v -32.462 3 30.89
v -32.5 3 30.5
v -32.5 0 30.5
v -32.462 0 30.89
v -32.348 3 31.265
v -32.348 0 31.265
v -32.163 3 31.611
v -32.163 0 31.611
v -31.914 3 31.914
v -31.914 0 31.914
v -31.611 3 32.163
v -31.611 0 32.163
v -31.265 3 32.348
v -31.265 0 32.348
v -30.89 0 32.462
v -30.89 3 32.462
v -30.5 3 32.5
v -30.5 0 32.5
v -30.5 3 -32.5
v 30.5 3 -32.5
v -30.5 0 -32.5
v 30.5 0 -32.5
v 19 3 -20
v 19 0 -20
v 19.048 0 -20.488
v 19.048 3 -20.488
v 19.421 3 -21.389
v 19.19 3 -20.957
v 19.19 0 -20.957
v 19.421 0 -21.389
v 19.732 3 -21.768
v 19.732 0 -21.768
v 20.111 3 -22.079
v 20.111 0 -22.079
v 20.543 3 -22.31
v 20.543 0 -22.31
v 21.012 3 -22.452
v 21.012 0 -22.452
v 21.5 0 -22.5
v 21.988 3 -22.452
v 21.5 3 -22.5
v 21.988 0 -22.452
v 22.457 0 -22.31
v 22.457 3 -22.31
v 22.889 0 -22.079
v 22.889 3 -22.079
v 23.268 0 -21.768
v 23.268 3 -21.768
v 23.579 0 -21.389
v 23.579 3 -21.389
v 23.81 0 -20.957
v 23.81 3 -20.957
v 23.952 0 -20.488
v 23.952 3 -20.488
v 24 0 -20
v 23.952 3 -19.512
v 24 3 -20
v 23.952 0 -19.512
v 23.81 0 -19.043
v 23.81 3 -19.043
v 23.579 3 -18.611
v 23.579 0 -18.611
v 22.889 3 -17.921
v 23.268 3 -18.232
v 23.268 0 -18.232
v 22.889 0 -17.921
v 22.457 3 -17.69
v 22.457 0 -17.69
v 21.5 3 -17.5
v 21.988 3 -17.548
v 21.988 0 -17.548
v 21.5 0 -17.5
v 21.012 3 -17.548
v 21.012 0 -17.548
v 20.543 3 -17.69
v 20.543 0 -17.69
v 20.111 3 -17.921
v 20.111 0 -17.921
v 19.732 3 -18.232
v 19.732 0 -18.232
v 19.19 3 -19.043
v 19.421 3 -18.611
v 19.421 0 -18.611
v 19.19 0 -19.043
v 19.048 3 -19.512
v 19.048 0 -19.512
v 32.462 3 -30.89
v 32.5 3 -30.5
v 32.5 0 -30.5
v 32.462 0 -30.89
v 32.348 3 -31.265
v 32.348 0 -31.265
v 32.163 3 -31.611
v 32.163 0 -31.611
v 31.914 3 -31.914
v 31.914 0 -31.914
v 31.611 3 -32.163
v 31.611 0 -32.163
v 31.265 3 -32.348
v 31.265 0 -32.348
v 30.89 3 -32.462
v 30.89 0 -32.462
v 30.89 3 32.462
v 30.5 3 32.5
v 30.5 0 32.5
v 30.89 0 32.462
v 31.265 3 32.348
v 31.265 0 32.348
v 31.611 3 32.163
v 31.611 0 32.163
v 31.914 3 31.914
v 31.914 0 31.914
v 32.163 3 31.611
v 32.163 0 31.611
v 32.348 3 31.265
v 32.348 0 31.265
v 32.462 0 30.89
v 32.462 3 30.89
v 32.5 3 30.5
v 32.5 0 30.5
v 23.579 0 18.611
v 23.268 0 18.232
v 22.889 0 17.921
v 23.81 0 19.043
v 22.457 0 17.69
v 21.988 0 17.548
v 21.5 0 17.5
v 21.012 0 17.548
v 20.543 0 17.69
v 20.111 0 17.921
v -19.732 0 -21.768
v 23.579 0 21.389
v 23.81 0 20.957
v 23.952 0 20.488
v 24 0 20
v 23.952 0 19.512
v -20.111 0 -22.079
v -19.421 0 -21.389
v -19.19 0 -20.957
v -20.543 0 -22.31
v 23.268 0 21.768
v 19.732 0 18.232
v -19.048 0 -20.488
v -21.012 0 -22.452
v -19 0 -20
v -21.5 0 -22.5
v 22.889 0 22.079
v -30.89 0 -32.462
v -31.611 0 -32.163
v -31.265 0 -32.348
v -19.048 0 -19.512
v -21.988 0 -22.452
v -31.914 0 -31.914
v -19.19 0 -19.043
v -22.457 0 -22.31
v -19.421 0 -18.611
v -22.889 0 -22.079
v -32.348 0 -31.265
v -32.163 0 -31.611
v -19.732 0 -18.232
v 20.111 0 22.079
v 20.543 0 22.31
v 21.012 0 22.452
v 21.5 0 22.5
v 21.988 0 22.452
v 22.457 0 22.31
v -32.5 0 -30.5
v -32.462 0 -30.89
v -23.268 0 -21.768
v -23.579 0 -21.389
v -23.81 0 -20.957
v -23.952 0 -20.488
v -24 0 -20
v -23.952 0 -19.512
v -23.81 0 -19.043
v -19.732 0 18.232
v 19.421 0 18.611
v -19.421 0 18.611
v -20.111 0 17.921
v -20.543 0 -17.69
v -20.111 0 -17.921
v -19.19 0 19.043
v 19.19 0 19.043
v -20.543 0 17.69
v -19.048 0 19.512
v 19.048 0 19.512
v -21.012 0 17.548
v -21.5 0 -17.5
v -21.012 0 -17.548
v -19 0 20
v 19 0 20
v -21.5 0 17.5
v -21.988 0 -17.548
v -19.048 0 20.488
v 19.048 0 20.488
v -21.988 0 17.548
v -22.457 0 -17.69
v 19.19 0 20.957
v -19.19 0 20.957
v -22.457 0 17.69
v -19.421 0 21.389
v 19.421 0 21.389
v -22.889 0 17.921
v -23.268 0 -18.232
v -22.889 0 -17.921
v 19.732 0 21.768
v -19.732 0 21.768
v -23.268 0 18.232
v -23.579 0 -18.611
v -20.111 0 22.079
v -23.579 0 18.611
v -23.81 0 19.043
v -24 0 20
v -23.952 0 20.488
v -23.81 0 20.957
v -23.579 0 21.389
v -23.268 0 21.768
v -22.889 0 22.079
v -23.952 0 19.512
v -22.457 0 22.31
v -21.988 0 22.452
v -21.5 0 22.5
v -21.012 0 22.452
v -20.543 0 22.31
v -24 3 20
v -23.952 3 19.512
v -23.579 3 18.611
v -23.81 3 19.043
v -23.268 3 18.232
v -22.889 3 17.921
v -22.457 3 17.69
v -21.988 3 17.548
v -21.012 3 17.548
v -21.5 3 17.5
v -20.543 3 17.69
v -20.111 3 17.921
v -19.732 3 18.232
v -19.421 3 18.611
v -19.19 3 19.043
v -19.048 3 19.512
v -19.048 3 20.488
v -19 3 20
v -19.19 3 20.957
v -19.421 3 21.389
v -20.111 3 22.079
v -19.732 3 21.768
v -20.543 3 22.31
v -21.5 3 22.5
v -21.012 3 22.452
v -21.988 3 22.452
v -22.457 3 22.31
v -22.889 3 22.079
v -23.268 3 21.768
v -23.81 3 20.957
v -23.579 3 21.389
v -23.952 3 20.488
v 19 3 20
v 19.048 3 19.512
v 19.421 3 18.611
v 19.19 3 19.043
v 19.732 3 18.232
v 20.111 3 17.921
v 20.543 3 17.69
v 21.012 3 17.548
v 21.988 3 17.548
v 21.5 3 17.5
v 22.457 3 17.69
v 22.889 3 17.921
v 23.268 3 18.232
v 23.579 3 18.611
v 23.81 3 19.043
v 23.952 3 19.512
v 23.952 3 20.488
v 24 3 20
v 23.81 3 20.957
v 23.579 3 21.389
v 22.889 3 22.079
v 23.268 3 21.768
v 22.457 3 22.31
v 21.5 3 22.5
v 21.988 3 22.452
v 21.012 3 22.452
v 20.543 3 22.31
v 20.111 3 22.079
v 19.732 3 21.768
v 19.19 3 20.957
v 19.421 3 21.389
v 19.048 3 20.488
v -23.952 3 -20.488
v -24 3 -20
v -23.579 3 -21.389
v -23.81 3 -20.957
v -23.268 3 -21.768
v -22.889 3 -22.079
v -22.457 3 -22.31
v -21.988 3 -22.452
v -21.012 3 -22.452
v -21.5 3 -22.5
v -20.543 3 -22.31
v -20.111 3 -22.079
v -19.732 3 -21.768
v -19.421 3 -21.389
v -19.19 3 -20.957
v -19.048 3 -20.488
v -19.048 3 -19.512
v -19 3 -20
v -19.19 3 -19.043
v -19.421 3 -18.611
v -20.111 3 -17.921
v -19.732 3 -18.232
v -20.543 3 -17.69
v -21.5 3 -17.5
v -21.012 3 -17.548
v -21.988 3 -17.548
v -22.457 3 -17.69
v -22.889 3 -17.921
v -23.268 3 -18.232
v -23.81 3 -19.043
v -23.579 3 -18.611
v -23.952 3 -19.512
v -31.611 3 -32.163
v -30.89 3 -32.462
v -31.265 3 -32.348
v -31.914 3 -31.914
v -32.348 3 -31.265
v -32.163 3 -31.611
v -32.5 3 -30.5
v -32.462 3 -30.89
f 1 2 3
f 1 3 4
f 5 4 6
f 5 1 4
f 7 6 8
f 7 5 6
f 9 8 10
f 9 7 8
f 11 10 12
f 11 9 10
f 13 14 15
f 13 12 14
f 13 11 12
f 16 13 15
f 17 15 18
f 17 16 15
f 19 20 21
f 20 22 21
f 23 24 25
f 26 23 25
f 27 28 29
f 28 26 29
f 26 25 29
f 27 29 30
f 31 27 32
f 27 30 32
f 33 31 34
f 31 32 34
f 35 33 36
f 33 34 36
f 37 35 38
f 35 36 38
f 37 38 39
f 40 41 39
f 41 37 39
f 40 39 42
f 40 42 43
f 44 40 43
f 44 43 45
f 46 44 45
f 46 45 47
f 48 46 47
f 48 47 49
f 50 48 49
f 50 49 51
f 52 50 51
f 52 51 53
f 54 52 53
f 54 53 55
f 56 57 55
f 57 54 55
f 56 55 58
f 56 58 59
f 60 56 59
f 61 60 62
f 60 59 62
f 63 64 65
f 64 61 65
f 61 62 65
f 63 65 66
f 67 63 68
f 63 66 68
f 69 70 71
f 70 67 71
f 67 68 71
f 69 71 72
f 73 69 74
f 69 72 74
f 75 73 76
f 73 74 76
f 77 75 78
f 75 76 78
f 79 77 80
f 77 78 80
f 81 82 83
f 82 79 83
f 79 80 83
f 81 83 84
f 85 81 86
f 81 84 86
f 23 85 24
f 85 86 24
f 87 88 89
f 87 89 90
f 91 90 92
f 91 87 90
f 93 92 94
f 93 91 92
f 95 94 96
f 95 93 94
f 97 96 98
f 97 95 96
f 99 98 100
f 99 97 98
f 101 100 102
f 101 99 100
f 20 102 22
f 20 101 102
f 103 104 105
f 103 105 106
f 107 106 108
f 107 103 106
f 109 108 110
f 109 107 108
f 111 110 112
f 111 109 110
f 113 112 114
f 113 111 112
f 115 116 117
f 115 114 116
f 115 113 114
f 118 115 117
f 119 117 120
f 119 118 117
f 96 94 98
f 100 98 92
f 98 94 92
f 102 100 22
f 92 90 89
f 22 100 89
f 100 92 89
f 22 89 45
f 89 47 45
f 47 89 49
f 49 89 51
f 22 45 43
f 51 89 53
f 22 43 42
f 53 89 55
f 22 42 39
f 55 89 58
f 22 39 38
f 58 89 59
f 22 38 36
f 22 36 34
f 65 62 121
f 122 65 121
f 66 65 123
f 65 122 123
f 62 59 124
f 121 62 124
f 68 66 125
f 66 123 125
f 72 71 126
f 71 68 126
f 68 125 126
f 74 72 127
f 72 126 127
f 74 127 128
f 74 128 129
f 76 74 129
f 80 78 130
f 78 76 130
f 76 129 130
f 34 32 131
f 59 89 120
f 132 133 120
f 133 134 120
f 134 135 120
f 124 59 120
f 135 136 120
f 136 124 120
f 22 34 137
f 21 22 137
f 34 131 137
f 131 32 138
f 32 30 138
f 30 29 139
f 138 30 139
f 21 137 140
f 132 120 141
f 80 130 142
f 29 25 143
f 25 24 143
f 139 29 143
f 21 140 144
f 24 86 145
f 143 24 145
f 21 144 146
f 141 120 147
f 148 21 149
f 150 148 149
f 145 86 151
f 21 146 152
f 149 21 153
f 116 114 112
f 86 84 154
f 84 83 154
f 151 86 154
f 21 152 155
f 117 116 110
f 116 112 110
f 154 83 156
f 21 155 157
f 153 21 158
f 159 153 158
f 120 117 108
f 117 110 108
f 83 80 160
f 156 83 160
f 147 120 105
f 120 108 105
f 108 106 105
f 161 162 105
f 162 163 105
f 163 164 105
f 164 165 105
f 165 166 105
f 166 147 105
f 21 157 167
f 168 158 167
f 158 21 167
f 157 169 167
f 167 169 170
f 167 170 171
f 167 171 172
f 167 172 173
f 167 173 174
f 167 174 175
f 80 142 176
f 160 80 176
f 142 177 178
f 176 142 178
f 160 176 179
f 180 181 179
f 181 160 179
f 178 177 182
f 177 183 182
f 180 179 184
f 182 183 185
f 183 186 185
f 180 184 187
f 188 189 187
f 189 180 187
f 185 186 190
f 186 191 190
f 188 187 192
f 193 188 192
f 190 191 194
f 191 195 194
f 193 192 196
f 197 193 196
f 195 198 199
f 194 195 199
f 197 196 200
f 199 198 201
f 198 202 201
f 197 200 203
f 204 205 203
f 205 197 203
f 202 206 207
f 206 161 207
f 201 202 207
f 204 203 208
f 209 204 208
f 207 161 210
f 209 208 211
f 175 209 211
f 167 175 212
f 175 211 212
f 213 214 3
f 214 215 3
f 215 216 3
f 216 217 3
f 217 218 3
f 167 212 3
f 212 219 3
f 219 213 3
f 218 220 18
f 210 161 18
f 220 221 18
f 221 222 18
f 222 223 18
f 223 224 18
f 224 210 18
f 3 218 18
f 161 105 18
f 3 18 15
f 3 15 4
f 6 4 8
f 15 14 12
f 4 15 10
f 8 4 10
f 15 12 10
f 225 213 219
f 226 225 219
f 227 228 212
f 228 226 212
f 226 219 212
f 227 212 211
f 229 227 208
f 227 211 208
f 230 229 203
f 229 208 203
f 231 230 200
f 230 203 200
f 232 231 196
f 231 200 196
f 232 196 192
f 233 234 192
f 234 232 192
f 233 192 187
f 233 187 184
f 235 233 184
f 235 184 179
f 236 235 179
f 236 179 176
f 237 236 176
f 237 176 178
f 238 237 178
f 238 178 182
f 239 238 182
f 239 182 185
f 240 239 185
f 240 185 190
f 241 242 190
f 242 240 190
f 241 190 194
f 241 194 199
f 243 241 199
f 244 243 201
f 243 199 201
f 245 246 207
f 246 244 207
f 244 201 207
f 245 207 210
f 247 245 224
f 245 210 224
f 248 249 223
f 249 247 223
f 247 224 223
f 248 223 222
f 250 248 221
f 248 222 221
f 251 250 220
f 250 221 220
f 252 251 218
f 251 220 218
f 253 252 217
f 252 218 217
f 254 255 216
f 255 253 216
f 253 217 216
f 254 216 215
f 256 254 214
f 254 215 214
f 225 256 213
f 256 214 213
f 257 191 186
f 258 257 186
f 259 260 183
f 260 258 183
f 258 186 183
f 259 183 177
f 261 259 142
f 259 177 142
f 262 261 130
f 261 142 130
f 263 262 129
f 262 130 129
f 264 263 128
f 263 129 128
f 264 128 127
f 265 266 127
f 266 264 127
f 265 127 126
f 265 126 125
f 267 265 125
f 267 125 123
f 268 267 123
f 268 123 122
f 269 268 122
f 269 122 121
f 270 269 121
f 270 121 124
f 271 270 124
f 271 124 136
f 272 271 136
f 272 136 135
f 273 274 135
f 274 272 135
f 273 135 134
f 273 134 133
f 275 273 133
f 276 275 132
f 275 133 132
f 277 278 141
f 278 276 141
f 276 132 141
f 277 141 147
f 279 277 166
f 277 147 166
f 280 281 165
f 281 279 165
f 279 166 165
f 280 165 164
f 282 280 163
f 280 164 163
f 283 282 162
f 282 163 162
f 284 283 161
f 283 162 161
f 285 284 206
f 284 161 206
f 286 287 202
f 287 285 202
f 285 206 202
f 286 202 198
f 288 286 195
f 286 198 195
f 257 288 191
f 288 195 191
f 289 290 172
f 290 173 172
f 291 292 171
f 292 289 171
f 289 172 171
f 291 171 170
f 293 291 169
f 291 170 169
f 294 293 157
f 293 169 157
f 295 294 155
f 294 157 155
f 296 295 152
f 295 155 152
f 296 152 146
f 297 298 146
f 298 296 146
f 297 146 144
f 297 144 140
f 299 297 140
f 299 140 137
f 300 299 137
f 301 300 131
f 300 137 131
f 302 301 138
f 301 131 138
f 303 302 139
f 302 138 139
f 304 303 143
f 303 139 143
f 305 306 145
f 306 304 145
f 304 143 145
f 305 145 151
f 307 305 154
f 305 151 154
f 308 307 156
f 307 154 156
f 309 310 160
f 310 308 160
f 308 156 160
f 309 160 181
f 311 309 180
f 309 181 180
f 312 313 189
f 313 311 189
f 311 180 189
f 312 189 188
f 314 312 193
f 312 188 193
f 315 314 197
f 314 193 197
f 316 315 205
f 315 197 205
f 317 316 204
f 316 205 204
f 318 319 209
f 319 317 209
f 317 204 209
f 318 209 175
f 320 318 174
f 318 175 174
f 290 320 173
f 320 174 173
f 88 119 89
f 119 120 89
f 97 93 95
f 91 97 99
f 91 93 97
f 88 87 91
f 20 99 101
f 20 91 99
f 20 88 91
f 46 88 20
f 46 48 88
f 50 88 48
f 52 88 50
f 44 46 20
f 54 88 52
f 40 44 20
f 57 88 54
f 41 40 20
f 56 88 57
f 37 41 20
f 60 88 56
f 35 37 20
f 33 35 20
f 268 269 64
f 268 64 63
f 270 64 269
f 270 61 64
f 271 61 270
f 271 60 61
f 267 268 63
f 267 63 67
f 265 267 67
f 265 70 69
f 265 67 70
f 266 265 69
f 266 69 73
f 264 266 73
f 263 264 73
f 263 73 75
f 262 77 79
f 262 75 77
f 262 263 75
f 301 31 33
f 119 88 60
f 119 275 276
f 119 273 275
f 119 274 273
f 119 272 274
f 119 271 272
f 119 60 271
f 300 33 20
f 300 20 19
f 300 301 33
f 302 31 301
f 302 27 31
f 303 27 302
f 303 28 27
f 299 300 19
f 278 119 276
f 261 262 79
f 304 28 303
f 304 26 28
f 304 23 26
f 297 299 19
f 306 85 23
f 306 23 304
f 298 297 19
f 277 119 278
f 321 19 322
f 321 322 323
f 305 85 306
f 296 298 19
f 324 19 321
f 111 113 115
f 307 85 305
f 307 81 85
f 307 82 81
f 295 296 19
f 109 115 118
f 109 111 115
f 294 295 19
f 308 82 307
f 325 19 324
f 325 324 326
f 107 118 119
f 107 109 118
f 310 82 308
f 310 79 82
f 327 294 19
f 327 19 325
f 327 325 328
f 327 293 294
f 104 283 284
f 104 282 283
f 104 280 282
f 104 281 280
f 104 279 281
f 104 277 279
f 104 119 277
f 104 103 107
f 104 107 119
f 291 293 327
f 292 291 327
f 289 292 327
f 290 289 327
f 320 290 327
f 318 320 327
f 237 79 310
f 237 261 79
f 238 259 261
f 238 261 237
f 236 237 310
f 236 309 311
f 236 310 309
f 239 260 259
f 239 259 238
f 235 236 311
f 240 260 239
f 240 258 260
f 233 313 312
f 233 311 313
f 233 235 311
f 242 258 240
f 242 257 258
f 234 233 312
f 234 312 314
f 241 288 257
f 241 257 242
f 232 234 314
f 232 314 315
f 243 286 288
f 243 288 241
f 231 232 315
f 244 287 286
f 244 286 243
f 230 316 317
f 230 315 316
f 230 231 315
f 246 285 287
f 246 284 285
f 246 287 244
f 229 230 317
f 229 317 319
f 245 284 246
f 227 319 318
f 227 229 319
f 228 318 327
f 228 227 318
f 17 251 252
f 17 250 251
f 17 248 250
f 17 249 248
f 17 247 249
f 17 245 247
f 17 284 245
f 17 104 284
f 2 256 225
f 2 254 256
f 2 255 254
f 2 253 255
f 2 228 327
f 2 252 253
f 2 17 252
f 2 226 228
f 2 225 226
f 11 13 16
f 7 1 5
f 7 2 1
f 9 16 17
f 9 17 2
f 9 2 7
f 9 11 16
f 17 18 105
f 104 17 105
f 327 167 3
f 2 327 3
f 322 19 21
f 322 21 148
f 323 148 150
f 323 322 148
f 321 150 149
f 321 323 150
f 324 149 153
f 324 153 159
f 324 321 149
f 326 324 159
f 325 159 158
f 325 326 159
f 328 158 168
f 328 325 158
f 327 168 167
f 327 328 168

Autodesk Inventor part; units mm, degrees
ref_plane "YZ Plane" through (0, 0, 0) normal (1, 0, 0) x (0, 1, 0)
ref_plane "XZ Plane" through (0, 0, 0) normal (0, 1, 0) x (-1, 0, 0)
ref_plane "XY Plane" through (0, 0, 0) normal (0, 0, 1) x (1, 0, 0)
sketch "Sketch1" plane through (0, 0, 0) normal (0, 1, 0) x (-1, 0, 0)
  line L0 (-32.5, -32.5) -> (32.5, -32.5)
  line L1 (32.5, -32.5) -> (32.5, 32.5)
  line L2 (32.5, 32.5) -> (-32.5, 32.5)
  line L3 (-32.5, 32.5) -> (-32.5, -32.5)
  line L4 (-32.5, -32.5) -> (32.5, 32.5) construction
  line L5 (32.5, -32.5) -> (-32.5, 32.5) construction
  line L6 (-21.5, -20) -> (21.5, -20) construction
  line L7 (21.5, -20) -> (21.5, 20) construction
  line L8 (21.5, 20) -> (-21.5, 20) construction
  line L9 (-21.5, 20) -> (-21.5, -20) construction
  line L10 (-21.5, -20) -> (21.5, 20) construction
  line L11 (21.5, -20) -> (-21.5, 20) construction
  circle A0 centre (21.5, 20) radius 2.5
  point P0 (0, 0)
  dimension "d0" = 65
  dimension "d1" = 65
  dimension "d5" = 43
  dimension "d6" = 40
  dimension "d7" = 5
extrude "Extrusion1" add sketch "Sketch1" along normal blind 3 contours L3 L2 L1 L0 | A0
fillet "Fillet1" radius 2 4 edges at (32.5, 1.5, 32.5) (32.5, 1.5, -32.5) (-32.5, 1.5, 32.5) (-32.5, 1.5, -32.5)
extrude "Extrusion2" cut sketch "Sketch1" along normal blind 3 contours A0
pattern_linear "Rectangular Pattern1" count 2 spacing 40 along (0, 0, -1) count 2 spacing 43 along (1, 0, 0) of "Extrusion2"
properties part number "wheel_plate"
